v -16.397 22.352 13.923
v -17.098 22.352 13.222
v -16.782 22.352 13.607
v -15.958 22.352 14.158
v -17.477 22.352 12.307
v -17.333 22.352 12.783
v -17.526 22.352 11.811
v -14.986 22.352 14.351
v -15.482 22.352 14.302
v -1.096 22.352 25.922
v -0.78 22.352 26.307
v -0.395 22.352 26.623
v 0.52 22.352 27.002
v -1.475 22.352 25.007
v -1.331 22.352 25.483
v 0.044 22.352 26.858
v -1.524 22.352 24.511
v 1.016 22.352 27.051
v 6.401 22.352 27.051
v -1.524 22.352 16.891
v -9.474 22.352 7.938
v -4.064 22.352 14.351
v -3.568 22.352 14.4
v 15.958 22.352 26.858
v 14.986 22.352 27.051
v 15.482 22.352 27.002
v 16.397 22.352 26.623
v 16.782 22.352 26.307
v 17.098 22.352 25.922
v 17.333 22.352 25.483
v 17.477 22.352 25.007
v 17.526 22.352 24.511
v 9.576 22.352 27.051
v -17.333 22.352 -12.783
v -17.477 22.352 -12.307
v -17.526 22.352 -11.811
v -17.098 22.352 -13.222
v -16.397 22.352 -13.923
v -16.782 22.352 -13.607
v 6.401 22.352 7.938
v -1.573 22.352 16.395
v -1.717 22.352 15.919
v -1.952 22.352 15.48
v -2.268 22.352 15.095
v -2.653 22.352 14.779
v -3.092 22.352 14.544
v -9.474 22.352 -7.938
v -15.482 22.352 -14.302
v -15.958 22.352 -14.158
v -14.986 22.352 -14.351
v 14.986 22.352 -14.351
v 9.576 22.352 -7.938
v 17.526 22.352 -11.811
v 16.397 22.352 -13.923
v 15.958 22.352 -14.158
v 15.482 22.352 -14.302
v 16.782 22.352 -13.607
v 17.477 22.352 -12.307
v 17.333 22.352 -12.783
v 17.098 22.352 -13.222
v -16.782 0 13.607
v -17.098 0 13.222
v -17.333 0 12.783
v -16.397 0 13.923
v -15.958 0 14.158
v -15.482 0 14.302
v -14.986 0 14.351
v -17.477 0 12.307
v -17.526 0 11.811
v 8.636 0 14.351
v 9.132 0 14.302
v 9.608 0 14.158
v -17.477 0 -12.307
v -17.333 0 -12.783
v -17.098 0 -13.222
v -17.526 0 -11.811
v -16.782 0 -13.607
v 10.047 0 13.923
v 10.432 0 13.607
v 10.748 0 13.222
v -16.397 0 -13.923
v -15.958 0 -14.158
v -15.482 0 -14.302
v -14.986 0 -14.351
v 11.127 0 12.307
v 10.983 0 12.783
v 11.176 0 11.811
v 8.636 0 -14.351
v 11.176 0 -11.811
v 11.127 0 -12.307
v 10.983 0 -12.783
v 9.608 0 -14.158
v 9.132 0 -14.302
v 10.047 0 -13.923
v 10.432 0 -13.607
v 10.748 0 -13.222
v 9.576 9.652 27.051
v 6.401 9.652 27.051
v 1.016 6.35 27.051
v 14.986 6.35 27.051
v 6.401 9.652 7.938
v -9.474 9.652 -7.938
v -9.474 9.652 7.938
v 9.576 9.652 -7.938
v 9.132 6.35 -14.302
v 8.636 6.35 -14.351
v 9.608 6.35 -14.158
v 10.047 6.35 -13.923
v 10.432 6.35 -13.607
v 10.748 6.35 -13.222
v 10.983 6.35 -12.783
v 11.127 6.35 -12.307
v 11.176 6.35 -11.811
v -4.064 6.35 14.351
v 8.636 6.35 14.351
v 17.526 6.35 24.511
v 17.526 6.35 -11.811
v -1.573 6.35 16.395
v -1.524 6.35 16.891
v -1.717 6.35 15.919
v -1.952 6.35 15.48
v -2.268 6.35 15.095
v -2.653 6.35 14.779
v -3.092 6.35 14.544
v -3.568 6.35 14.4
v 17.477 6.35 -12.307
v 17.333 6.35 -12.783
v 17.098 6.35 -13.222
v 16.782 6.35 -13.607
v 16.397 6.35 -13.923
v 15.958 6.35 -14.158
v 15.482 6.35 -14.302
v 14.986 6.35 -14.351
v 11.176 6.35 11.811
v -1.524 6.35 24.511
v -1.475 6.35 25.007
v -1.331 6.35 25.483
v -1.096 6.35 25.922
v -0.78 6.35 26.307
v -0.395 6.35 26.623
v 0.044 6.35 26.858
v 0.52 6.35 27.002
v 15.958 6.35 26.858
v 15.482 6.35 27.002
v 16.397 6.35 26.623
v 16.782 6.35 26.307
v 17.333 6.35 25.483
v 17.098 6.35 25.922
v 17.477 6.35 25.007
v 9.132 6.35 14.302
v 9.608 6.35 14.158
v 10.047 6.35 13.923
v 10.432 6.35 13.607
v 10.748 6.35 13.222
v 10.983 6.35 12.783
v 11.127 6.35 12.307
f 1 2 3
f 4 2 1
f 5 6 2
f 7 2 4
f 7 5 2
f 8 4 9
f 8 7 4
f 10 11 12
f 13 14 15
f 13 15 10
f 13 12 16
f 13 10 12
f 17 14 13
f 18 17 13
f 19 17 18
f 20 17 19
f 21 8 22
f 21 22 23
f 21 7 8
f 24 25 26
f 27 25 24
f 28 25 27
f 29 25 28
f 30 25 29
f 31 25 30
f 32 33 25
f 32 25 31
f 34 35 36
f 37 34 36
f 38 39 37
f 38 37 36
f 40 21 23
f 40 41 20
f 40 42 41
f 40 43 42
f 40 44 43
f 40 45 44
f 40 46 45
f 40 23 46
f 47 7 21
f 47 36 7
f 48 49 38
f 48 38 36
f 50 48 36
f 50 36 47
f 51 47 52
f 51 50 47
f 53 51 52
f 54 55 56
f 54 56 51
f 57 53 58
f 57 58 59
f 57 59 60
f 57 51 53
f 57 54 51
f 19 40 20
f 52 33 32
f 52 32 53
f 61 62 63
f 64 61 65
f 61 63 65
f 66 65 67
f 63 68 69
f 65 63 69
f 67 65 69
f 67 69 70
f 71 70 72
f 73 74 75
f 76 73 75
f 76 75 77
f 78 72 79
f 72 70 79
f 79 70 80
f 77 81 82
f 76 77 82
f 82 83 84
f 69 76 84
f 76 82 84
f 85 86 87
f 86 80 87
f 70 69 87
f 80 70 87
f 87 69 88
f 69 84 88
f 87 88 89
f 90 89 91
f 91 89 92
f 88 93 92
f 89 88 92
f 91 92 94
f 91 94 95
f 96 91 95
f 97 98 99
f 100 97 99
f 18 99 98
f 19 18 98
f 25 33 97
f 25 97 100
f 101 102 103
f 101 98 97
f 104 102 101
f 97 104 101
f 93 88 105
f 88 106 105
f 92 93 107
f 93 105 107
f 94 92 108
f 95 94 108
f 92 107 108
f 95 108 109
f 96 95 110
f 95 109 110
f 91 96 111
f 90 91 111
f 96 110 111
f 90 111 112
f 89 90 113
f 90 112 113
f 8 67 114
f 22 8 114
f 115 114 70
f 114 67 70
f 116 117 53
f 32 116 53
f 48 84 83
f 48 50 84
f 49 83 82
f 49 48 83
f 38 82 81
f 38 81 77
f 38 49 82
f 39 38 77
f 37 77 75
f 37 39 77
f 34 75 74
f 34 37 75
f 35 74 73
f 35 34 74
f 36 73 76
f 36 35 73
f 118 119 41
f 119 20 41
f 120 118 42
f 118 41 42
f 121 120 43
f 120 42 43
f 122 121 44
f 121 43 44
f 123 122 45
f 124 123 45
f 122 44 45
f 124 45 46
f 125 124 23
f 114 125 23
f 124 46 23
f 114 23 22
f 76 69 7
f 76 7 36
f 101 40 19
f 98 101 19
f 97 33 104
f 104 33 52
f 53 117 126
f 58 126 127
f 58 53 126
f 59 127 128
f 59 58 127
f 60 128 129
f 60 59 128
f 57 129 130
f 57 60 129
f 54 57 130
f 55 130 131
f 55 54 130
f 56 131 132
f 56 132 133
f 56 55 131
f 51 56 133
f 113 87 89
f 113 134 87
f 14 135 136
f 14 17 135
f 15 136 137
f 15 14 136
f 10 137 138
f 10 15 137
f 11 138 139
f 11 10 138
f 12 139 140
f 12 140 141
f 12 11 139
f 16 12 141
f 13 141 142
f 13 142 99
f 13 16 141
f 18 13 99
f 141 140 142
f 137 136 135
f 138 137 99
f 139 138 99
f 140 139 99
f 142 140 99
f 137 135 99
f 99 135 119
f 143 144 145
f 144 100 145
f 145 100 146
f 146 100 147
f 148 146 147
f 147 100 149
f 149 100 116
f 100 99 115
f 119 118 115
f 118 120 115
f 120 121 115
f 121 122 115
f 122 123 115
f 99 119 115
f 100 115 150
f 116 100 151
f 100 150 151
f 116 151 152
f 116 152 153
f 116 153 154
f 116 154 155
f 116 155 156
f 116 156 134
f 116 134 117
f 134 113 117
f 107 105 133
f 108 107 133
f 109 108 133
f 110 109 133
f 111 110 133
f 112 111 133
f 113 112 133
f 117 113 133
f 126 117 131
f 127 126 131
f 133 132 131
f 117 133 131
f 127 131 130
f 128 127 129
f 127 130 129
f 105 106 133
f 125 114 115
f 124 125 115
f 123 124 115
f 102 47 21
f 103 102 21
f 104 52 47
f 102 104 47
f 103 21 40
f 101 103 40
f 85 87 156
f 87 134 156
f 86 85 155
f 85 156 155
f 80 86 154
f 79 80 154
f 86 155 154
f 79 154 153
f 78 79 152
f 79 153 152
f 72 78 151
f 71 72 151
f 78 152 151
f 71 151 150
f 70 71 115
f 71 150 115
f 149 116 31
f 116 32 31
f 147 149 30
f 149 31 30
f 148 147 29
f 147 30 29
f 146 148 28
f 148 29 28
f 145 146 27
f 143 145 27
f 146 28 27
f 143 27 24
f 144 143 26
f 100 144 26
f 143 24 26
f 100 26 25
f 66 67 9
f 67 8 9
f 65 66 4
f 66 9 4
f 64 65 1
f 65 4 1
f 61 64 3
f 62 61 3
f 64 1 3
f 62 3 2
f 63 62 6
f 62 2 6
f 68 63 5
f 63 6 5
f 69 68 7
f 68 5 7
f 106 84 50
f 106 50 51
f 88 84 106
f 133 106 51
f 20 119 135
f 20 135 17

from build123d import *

# Parameters (mm, degrees)
SKETCH1_W           = 35.052
SKETCH1_H           = 28.702
BOSS_EXTRUDE5_DEPTH = 22.352
SKETCH6_W           = 28.702
SKETCH6_H           = 6.35
CUT_EXTRUDE1_DEPTH  = 6.35
SKETCH7_W           = 19.05
SKETCH7_H           = 16.002
BOSS_EXTRUDE6_DEPTH = 12.7
CUT_EXTRUDE2_DEPTH  = 12.7
FILLET5_R           = 2.54
FILLET6_R           = 2.54


with BuildPart() as part:
    # Sketch1 → Boss-Extrude5 (new body)
    with BuildSketch(Plane(origin=(0, 0, 0), x_dir=(1, 0, 0), z_dir=(0, 1, 0))):
        Rectangle(SKETCH1_W, SKETCH1_H)
    extrude(amount=BOSS_EXTRUDE5_DEPTH)

    # Sketch6 → Cut-Extrude1 (cut)
    with BuildSketch(Plane(origin=(17.526, 0, 0), x_dir=(0, 0, -1), z_dir=(1, 0, 0))):
        with Locations((0, 3.175)):
            Rectangle(SKETCH6_W, SKETCH6_H)
    extrude(amount=-CUT_EXTRUDE1_DEPTH, mode=Mode.SUBTRACT)

    # Sketch7 → Boss-Extrude6 (add)
    with BuildSketch(Plane.XY.offset(14.351)):
        with Locations((8.001, 14.351)):
            Rectangle(SKETCH7_W, SKETCH7_H)
    extrude(amount=BOSS_EXTRUDE6_DEPTH)

    # Sketch8 → Cut-Extrude2 (cut)
    with BuildSketch(Plane(origin=(0, 22.352, 0), x_dir=(1, 0, 0), z_dir=(0, 1, 0))):
        Polygon((-9.4742, 7.9375), (-9.4742, -7.9375), (6.4008, -7.9375), (6.4008, -27.051), (9.5758, -27.051), (9.5758, 7.9375), align=None)
    extrude(amount=-CUT_EXTRUDE2_DEPTH, mode=Mode.SUBTRACT)

    # Fillet5
    fillet5_edges = [part.edges().sort_by_distance(p)[0] for p in [
        (11.176, 3.175, -14.351),
        (-1.524, 14.351, 14.351),
        (-17.526, 11.176, 14.351),
        (-17.526, 11.176, -14.351),
        (17.526, 14.351, -14.351),
    ]]
    fillet(fillet5_edges, radius=FILLET5_R)

    # Fillet6
    fillet6_edges = [part.edges().sort_by_distance(p)[0] for p in [
        (11.176, 3.175, 14.351),
        (-1.524, 14.351, 27.051),
        (17.526, 14.351, 27.051),
    ]]
    fillet(fillet6_edges, radius=FILLET6_R)


solid = part.part
